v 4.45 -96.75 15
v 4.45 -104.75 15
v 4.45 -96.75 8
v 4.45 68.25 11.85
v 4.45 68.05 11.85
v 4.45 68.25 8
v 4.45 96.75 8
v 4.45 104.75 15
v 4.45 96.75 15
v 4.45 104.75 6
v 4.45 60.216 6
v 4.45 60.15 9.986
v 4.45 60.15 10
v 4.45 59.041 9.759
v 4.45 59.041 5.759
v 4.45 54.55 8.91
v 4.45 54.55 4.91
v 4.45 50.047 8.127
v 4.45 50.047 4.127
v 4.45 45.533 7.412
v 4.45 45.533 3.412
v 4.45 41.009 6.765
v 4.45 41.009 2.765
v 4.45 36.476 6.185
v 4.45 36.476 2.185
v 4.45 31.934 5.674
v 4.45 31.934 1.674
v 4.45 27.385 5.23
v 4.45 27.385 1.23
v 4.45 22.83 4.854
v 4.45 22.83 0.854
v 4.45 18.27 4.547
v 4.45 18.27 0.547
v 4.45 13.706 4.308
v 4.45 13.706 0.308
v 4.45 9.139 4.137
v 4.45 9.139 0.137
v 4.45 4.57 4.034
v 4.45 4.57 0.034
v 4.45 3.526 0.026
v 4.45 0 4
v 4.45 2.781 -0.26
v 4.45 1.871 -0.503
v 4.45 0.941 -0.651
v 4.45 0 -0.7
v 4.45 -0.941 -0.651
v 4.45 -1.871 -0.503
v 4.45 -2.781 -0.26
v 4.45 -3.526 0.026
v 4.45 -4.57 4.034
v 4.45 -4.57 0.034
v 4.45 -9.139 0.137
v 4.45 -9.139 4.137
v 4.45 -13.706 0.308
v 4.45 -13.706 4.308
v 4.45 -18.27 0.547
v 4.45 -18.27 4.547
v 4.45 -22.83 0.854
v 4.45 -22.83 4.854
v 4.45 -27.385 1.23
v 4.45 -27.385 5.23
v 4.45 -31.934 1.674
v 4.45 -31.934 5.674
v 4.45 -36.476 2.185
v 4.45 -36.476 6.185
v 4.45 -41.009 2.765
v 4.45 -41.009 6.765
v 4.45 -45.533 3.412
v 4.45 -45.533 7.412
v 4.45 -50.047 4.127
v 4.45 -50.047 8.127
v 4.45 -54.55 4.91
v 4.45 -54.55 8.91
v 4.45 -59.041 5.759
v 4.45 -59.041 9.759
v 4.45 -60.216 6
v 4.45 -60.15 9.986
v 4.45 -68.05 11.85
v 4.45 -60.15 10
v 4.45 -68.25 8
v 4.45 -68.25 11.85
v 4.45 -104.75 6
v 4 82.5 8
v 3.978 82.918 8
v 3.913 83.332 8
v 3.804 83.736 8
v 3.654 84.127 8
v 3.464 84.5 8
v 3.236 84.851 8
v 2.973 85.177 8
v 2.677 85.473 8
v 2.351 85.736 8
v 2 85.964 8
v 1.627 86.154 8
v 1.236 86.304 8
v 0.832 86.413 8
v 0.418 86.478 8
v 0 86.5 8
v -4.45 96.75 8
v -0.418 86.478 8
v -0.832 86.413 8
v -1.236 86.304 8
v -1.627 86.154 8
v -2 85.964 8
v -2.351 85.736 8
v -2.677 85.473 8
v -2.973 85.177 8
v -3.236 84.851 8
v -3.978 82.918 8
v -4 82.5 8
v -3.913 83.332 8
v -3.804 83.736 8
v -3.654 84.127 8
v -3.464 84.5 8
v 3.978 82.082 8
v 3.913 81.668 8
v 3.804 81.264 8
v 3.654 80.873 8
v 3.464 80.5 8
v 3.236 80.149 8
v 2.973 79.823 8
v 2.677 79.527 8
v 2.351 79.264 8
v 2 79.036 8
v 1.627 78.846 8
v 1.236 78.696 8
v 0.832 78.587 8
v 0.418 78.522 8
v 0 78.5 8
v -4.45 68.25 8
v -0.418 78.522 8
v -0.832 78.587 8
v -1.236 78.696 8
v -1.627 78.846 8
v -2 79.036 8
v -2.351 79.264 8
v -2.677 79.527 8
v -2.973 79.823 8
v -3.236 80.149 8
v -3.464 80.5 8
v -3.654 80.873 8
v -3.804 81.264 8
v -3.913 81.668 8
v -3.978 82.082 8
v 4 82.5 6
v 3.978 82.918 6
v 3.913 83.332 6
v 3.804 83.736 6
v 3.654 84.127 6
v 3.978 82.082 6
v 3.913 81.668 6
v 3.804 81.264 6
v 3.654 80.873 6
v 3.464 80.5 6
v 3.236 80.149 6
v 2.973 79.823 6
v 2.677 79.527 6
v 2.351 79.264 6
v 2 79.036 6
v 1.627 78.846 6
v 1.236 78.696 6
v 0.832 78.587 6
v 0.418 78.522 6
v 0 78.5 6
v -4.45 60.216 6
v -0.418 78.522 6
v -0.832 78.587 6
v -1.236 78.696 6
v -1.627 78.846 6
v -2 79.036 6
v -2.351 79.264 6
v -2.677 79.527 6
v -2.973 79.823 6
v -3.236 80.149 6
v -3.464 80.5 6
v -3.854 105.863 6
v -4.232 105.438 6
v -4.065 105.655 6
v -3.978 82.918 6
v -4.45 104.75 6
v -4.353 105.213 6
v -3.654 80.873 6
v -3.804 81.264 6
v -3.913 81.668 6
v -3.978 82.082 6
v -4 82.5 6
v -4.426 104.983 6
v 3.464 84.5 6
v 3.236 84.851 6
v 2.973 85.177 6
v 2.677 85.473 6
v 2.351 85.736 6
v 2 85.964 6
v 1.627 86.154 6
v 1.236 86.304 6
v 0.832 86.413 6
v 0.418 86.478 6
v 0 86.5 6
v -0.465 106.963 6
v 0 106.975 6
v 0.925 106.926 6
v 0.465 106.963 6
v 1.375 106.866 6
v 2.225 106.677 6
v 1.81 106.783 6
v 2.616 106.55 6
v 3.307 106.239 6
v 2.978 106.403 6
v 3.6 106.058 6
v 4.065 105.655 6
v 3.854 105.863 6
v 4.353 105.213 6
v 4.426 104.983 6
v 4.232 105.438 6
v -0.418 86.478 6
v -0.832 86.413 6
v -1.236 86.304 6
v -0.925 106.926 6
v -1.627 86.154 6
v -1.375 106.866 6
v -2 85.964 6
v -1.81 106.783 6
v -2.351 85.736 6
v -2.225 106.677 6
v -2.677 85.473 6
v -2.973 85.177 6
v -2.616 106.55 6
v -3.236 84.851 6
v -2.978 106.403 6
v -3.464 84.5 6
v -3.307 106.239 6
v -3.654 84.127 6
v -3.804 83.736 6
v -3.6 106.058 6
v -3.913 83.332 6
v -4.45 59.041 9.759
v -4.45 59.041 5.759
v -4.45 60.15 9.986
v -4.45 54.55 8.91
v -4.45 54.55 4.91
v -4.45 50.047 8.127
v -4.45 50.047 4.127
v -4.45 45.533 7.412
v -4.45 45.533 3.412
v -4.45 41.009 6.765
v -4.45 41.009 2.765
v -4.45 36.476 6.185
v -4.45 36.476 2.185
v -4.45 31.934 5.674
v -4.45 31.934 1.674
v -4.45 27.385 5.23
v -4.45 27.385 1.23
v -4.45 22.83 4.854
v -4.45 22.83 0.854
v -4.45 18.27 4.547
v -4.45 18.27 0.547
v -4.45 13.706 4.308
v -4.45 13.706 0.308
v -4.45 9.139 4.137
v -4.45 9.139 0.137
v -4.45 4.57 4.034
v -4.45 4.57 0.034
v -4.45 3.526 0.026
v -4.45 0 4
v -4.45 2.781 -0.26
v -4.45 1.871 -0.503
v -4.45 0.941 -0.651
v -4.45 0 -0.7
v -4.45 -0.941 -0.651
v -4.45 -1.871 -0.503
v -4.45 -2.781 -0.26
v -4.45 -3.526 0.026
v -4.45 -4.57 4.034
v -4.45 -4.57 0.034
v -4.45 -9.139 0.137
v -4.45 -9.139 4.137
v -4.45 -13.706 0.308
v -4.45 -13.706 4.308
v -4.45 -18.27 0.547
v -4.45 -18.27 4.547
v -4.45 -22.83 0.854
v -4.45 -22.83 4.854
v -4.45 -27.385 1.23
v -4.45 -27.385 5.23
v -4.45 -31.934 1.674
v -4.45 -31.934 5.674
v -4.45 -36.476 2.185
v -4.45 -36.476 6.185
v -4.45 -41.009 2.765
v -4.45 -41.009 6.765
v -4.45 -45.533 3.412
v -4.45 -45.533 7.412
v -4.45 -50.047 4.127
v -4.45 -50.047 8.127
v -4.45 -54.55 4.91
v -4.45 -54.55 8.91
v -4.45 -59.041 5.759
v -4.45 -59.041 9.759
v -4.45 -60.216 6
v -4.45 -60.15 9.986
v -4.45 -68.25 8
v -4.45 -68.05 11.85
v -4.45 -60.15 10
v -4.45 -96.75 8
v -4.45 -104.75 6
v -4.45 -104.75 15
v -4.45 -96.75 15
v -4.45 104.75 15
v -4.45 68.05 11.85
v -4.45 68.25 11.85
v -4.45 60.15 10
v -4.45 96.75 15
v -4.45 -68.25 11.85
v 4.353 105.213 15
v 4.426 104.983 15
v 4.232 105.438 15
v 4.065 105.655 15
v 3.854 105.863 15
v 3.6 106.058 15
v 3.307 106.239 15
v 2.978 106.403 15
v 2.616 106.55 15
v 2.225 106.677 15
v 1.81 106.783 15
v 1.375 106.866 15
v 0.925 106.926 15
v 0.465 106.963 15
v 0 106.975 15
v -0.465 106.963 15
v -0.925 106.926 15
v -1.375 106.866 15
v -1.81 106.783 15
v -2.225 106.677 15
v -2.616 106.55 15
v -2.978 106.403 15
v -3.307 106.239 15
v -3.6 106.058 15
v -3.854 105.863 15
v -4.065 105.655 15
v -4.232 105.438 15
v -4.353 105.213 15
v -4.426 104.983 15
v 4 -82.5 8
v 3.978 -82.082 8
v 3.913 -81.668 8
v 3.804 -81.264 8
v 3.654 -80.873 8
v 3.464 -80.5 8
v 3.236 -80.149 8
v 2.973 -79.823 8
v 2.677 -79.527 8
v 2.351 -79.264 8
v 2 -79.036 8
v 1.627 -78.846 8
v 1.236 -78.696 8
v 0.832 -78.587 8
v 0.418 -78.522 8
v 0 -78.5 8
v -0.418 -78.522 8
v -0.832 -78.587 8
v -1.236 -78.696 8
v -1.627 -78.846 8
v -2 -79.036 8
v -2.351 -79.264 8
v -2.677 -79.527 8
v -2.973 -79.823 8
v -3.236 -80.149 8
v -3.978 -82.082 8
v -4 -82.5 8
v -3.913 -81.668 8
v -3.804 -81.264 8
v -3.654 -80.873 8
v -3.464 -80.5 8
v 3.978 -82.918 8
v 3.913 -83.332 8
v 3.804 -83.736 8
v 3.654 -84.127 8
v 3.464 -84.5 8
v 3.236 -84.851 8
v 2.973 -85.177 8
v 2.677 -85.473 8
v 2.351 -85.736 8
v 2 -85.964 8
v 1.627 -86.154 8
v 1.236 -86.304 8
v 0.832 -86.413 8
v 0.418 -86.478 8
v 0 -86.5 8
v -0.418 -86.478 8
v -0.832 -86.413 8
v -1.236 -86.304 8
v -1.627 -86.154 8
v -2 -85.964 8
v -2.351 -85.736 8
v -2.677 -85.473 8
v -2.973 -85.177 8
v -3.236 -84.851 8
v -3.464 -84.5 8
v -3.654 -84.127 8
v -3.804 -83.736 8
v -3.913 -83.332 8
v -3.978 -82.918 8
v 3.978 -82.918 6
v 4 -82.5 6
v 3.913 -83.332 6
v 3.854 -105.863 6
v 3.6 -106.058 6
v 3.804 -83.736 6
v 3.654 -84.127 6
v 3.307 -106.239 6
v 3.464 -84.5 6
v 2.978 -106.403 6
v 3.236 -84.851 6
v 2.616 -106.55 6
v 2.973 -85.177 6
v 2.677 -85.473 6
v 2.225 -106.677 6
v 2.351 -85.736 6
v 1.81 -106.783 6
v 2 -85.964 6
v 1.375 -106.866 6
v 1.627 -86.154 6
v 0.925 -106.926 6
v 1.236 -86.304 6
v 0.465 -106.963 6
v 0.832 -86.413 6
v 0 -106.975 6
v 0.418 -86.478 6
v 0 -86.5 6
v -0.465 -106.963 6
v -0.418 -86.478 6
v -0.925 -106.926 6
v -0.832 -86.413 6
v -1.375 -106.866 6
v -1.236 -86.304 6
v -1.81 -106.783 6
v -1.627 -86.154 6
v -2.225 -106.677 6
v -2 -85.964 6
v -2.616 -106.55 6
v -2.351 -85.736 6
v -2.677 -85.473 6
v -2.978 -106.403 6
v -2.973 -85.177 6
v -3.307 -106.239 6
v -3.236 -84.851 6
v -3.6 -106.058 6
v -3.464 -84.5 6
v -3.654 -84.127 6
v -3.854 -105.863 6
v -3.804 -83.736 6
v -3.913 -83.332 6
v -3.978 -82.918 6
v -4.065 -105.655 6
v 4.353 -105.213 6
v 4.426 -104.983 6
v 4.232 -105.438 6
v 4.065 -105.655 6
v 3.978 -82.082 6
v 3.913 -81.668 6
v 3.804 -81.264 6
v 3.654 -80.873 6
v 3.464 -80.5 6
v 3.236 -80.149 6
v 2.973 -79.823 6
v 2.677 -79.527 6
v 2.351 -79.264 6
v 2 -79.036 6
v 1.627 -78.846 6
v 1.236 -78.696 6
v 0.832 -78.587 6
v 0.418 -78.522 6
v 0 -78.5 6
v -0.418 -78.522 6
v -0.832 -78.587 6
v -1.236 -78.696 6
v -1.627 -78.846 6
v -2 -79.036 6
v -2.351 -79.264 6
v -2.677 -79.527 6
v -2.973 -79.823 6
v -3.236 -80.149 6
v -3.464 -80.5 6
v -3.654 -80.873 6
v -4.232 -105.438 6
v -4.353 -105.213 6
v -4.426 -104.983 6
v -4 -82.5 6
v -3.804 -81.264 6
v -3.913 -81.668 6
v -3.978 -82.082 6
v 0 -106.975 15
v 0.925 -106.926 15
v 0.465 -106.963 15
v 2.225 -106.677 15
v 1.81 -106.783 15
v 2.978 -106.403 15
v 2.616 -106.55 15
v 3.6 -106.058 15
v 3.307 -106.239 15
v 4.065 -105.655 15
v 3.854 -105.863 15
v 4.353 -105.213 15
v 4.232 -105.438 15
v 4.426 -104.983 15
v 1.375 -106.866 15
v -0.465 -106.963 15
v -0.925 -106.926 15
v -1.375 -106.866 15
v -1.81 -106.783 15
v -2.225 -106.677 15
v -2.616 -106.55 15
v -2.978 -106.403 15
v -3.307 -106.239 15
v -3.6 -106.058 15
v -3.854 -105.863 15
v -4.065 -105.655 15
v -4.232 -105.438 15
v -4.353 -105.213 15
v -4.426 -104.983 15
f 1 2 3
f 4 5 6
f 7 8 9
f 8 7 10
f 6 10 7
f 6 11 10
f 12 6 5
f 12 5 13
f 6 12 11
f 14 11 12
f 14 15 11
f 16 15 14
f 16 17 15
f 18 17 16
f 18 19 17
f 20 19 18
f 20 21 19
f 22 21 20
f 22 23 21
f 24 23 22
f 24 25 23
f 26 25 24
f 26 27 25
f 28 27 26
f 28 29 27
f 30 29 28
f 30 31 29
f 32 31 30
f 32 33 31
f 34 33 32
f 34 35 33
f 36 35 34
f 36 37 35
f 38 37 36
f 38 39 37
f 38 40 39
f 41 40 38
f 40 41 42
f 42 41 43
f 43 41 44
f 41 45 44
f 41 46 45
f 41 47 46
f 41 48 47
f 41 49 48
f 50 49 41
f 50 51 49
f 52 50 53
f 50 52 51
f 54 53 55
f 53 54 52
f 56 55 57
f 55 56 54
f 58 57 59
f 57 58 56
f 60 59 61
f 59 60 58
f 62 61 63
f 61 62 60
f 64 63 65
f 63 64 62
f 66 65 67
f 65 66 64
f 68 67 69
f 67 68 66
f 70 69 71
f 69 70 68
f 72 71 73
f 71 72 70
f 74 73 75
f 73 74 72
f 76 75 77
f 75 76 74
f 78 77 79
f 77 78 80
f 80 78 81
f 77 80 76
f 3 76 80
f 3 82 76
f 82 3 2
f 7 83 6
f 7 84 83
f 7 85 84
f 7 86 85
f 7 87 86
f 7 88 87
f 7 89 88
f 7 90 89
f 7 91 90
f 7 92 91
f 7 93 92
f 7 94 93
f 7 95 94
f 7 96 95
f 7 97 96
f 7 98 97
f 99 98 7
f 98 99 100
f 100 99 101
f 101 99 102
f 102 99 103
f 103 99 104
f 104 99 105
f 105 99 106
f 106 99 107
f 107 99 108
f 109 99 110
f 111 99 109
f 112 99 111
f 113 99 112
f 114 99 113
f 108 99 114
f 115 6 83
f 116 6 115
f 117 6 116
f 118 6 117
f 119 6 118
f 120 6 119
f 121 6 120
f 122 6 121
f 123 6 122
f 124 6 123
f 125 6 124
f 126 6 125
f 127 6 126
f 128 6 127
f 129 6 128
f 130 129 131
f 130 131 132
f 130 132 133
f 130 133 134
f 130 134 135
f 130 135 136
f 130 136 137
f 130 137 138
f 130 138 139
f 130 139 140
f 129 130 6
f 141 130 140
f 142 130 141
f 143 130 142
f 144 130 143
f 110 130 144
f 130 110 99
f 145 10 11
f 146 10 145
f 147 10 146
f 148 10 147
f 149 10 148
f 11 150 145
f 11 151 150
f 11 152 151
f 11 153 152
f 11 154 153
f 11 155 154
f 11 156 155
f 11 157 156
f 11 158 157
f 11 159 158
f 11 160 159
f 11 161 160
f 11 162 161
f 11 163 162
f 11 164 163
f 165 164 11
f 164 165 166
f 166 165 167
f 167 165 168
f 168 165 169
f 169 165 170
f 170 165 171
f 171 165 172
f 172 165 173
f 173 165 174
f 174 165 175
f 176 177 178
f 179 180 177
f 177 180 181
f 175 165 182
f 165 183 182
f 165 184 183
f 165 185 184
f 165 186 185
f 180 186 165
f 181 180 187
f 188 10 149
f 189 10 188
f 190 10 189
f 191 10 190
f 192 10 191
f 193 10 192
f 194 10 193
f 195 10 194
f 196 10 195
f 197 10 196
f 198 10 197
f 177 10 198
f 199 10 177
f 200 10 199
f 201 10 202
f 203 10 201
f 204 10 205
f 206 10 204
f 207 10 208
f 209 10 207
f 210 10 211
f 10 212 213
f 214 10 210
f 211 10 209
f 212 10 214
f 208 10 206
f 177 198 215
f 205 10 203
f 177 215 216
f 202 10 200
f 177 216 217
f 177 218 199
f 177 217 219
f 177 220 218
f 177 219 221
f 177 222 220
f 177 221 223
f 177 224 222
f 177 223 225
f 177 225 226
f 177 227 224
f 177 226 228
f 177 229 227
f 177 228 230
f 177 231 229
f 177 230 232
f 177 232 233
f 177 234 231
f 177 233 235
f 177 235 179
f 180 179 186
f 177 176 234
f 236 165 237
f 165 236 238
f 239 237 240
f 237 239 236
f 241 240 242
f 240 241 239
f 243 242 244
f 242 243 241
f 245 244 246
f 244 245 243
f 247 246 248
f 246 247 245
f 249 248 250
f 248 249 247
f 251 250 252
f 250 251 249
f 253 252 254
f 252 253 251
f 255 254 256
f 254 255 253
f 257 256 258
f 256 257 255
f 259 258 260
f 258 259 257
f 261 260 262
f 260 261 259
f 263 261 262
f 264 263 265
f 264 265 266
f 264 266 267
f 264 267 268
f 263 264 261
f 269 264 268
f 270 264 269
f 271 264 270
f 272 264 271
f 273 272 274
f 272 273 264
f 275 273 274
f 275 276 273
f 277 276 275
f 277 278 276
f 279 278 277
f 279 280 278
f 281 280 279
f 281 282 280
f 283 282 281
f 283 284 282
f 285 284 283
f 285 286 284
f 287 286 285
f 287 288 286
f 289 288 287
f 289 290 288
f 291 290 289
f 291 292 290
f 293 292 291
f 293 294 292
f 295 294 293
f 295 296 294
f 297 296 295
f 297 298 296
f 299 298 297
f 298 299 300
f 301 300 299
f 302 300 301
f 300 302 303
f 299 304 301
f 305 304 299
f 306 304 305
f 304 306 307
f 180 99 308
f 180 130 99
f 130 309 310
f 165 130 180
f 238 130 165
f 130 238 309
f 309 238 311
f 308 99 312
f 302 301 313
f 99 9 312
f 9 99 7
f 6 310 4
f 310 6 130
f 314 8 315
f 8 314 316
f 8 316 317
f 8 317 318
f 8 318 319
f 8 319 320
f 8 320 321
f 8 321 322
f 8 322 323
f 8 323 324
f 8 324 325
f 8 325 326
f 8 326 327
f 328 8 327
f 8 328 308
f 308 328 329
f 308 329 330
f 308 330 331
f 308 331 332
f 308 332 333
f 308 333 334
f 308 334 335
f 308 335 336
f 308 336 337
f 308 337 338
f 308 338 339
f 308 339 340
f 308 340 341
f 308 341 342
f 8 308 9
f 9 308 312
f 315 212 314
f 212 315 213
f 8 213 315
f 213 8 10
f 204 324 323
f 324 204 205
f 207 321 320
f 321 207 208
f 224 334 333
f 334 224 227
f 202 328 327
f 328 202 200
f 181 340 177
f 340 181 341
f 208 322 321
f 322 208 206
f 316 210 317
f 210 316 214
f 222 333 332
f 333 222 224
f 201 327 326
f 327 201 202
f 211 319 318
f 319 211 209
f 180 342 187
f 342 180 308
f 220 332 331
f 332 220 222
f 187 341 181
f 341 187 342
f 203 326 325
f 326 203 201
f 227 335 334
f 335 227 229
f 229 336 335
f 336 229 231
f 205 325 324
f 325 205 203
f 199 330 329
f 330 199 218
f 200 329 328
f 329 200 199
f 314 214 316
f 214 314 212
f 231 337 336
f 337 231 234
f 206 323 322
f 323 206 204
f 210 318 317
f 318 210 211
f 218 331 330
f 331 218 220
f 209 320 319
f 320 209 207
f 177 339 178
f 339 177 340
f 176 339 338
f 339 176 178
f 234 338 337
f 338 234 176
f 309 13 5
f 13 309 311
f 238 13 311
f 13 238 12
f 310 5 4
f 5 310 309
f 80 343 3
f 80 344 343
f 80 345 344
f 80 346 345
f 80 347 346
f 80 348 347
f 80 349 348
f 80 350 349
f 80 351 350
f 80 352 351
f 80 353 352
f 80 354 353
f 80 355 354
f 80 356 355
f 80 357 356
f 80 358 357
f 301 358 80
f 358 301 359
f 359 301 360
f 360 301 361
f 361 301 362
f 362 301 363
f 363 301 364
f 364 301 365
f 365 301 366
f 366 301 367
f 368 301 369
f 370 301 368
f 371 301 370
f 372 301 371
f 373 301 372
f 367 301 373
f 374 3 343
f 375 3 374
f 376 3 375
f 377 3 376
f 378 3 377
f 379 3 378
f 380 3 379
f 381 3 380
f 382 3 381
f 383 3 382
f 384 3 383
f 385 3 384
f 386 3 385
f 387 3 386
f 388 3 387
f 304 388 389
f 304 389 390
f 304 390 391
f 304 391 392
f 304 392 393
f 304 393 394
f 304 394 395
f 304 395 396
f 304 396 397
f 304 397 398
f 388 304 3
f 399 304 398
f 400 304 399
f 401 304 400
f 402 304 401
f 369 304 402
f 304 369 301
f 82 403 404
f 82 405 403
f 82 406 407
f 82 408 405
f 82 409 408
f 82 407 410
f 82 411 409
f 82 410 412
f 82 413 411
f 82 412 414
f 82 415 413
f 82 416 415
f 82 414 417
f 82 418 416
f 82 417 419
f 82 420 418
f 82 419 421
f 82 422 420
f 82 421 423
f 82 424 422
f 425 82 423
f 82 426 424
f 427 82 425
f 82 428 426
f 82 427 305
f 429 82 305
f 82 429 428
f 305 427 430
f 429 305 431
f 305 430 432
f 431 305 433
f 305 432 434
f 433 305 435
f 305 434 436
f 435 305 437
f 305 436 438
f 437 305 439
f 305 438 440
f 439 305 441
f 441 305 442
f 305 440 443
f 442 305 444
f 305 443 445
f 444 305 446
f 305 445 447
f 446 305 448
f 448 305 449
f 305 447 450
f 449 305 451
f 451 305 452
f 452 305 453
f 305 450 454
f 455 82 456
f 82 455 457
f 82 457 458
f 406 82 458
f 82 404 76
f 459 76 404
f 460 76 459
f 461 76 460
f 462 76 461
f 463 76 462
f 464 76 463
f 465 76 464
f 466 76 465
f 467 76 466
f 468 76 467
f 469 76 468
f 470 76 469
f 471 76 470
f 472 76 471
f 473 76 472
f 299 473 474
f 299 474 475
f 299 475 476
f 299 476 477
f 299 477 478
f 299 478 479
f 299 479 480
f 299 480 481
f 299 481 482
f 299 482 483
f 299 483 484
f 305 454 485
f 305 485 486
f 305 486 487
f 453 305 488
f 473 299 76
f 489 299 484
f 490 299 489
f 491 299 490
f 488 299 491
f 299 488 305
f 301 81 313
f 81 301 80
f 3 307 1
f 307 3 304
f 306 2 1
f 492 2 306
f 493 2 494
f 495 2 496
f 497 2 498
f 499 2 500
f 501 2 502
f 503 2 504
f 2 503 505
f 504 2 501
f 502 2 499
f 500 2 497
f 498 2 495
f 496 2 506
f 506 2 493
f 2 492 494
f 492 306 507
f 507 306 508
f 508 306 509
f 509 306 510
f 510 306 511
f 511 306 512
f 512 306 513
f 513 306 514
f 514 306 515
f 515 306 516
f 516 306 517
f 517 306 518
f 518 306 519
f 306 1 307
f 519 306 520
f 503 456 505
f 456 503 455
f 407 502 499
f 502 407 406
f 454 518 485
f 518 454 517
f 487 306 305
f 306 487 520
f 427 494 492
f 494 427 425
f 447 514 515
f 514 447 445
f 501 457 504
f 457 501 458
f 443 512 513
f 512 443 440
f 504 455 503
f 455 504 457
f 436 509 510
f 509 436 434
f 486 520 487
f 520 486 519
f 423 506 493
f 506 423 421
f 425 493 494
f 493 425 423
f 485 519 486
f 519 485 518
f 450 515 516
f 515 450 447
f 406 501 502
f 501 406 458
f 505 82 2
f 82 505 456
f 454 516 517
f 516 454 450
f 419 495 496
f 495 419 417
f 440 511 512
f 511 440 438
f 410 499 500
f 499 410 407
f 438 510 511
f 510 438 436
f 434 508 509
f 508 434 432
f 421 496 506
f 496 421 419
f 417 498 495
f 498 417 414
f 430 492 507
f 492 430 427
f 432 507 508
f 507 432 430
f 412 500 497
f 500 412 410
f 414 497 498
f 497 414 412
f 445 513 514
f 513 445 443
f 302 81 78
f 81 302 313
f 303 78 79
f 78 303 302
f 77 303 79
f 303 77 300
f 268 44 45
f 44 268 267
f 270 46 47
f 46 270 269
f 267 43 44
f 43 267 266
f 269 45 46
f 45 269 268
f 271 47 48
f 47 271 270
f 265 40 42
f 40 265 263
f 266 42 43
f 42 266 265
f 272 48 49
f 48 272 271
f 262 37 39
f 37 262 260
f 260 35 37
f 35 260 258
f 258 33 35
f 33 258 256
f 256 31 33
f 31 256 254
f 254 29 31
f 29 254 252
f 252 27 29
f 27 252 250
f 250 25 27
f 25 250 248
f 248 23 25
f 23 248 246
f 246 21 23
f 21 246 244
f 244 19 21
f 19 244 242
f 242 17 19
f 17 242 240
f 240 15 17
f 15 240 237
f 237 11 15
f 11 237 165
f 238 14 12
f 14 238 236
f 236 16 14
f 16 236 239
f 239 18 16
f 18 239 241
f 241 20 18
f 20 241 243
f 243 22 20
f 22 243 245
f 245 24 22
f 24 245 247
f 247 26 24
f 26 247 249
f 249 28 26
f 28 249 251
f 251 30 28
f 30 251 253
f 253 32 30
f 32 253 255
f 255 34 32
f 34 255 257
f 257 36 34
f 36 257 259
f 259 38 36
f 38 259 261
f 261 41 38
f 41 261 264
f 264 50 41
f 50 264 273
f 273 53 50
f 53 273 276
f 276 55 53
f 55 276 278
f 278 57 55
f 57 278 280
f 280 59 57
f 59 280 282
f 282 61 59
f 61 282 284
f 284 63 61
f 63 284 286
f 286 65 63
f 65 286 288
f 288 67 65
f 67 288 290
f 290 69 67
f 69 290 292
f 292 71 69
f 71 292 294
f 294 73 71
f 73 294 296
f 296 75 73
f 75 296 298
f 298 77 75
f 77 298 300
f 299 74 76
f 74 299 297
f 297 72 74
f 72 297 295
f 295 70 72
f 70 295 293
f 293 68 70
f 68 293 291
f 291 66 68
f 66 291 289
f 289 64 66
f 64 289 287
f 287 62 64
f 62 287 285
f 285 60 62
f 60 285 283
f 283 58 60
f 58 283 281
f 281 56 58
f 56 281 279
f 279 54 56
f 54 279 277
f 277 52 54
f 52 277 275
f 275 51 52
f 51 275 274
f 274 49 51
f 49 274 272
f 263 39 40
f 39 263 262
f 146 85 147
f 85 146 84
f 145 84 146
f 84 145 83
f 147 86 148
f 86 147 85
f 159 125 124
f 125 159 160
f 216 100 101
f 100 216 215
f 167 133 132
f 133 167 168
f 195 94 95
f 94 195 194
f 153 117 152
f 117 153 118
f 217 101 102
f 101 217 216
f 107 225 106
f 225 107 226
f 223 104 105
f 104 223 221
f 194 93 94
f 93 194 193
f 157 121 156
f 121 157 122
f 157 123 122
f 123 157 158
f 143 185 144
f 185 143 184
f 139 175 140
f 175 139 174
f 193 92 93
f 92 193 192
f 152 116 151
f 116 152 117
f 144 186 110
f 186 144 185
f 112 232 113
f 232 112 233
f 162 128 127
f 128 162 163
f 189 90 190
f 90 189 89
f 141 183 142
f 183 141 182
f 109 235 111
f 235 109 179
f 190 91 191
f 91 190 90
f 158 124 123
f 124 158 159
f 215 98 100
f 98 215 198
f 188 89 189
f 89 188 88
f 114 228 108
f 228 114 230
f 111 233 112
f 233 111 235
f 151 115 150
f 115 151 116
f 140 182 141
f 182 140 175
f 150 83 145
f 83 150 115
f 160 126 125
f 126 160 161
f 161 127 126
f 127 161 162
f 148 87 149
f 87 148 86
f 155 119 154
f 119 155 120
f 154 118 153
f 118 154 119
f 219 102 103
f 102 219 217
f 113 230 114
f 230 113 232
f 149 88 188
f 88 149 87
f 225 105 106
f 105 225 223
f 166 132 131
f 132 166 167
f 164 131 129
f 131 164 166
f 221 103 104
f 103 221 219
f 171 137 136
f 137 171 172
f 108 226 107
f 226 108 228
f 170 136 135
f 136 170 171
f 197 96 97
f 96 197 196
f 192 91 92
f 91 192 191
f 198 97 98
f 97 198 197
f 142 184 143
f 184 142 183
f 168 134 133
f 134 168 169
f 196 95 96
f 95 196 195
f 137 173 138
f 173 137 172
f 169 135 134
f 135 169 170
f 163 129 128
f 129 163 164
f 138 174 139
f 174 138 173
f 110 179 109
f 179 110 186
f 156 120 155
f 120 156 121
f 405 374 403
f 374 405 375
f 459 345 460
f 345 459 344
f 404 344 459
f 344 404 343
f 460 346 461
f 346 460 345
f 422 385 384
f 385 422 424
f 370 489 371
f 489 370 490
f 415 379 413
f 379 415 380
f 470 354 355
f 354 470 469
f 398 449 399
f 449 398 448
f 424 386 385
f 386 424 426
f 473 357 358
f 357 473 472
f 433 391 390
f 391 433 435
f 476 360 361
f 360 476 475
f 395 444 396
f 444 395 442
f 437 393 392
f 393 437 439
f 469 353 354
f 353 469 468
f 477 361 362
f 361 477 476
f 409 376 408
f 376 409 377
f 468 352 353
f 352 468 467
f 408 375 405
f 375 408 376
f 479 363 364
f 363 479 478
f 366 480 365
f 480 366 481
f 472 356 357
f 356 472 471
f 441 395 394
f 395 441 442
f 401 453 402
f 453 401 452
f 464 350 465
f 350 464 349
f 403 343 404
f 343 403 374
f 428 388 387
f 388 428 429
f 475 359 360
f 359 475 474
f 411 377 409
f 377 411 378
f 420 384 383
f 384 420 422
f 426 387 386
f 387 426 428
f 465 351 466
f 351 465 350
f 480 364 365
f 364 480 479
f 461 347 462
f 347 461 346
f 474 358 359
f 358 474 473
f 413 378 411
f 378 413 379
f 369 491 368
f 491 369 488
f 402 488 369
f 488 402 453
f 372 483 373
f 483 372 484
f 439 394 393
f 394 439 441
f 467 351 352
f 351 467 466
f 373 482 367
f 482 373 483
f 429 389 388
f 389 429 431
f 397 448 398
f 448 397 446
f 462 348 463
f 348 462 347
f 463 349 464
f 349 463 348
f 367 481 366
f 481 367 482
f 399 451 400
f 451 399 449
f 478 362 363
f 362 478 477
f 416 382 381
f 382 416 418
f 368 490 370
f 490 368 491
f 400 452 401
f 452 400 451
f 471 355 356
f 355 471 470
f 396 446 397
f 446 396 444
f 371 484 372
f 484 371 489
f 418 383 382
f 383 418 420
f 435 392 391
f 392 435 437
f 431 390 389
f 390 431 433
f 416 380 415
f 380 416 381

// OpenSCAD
// Wing-Foil Mast Nut Spacer/Holder
// Version: 0.12

/* [General Settings] */
// Distance between bolt centers
nut_spacing = 165.0;

/* [Track & Nut Dimensions] */
shaft_width = 8.9;
nut_length = 28.5;
nut_thickness = 5.5;
bolt_hole_dia = 8.0;

/* [Holder Design Features] */
base_thickness = 2.0;
bridge_thickness = 4.0;
spring_bow = 6.0;
guide_height = 9.0;
stop_length = 8.0;

// The diameter of the cylinder used for the bottom bump
bottom_bump_dia = 18.0;
// Percent of the cylinder radius to protrude (0.3 = 30%)
bump_profile_percent = 0.3;

/* [Hidden] */
$fn = 60;
lip_thickness = base_thickness + nut_thickness * 0.7;

module extruded_bridge(w, span, t, bow, overlap=0.4) {
    R = (span*span)/(8*bow) + bow/2;
    rotate([90, 0, 90])
    linear_extrude(w, center=true)
    intersection() {
        translate([0, -bow])
            square([span + overlap, 2*R], center=true);
        translate([0, R - bow])
            difference() {
                // By translating the same circle vertically, we ensure the ends are flat
                // instead of being perpendicular to the curve.
                circle(r=R, $fn=420);
                translate([0, t]) circle(r=R, $fn=420);
            }
    }
}

module complete_spacer() {
    difference() {
        union() {
            for (dir = [1, -1]) {
                nut_y = dir * nut_spacing/2;

                // 1. Base platform
                translate([0, nut_y, base_thickness/2])
                    cube([shaft_width, nut_length, base_thickness], center=true);

                // 2. Outer Vertical Guide Wall (Centering)
                outer_pos = nut_y + dir * (nut_length/2 + stop_length/2);
                translate([0, outer_pos, guide_height/2])
                    cube([shaft_width, stop_length, guide_height], center=true);

                // Rounded tip
                extreme_end = nut_y + dir * (nut_length/2 + stop_length);
                translate([0, extreme_end, guide_height/2])
                    scale([1, 0.5, 1]) cylinder(h=guide_height, d=shaft_width, center=true);

                // 3. Inner Transition (Vertical wall + Slope)
                inner_start = nut_y - dir * nut_length/2;
                inner_end = inner_start - dir * stop_length;

                hull() {
                    translate([0, inner_start - dir*0.1, lip_thickness/2])
                        cube([shaft_width, 0.2, lip_thickness], center=true);
                    translate([0, inner_end, bridge_thickness/2])
                        cube([shaft_width, 0.2, bridge_thickness], center=true);
                }
            }

            // 4. Continuous Spring Bridge
            bridge_span = nut_spacing - nut_length - (stop_length * 2);
            extruded_bridge(w=shaft_width, span=bridge_span, t=bridge_thickness, bow=spring_bow, overlap=0.2);

            // 5. Recessed 30% Bump
            // Positioned so it is cut inside the body and only protrudes from the bottom
            bump_radius = bottom_bump_dia / 2;
            protrusion_height = bump_radius * bump_profile_percent;

            translate([0, 0, -spring_bow + bridge_thickness/2])
            intersection() {
                // The Cylinder
                translate([0, 0, bump_radius - protrusion_height])
                    rotate([0, 90, 0])
                    cylinder(h=shaft_width, d=bottom_bump_dia, center=true);

                // The Shaving Cube: Limits the bump to the bridge's vertical volume
                // This ensures the bump never pokes out the top of the bridge
                translate([0, 0, -protrusion_height])
                    cube([shaft_width + 1, bottom_bump_dia, bridge_thickness + protrusion_height * 2], center=true);
            }
        }

        // Bolt holes
        for (dir = [1, -1]) {
            nut_y = dir * nut_spacing/2;
            translate([0, nut_y, -1])
                cylinder(h=guide_height + 20, d=bolt_hole_dia);
        }
    }
}

// Final assembly positioning
translate([0, 0, spring_bow])
    complete_spacer();
